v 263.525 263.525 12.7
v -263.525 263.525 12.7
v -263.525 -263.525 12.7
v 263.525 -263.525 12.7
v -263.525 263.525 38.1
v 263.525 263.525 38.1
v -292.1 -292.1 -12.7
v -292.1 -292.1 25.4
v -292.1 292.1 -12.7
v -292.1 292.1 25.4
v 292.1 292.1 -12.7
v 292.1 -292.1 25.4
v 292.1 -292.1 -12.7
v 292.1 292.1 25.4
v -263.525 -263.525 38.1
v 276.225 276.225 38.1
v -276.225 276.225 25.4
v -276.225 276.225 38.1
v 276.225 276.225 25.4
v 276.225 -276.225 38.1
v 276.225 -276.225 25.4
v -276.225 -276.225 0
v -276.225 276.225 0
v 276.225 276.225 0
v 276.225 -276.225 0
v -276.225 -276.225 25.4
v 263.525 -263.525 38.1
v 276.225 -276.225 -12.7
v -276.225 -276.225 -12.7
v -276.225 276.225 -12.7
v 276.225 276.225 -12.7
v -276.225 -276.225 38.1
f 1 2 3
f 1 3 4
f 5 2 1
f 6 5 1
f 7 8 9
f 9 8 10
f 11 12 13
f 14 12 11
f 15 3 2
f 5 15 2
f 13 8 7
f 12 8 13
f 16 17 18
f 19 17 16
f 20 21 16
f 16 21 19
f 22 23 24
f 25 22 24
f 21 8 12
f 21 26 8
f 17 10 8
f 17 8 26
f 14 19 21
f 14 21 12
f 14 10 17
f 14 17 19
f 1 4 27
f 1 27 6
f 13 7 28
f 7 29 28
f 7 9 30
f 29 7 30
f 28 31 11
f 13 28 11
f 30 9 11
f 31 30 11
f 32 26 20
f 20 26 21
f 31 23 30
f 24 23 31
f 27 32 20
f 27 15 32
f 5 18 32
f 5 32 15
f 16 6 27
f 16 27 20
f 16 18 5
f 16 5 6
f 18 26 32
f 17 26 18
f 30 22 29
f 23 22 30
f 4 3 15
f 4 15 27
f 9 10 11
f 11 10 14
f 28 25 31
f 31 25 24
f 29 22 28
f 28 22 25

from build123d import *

# Parameters (mm, degrees)
F0_W          = 584.2
F0_H          = 584.2
F1_DEPTH      = 12.7
F2_W          = 584.2
F2_H          = 584.2
F2_W_2        = 558.8
F2_H_2        = 558.8
F3_DEPTH      = 152.4
F4_W          = 1017.536164
F4_H          = 883.057714
F4_W_2        = 558.8
F4_H_2        = 558.8
F5_DEPTH      = 508
F6_W          = 552.45
F6_H          = 552.45
F6_W_2        = 527.05
F6_H_2        = 527.05
F7_DEPTH      = 25.4
F8_W          = 584.2
F8_H          = 584.2
F8_W_2        = 552.45
F8_H_2        = 552.45
F9_DEPTH      = 12.7
F9_DEPTH_BACK = 25.4


with BuildPart() as f1:
    # F0 (on Top) → F1 (new body)
    with BuildSketch(Plane.XY):
        Rectangle(F0_W, F0_H)
    extrude(amount=F1_DEPTH)

    # F2 (on face) → F3 (join)
    with BuildSketch(Plane.XY.offset(12.7)):
        Rectangle(F2_W, F2_H)
        Rectangle(F2_W_2, F2_H_2, mode=Mode.SUBTRACT)
    extrude(amount=F3_DEPTH)

    # F4 (on face) → F5 (cut)
    with BuildSketch(Plane.XY.offset(12.7)):
        Rectangle(F4_W, F4_H)
        Rectangle(F4_W_2, F4_H_2, mode=Mode.SUBTRACT)
    extrude(amount=F5_DEPTH, mode=Mode.SUBTRACT)

    # F6 (on face) → F7 (join)
    with BuildSketch(Plane.XY.offset(12.7)):
        Rectangle(F6_W, F6_H)
        Rectangle(F6_W_2, F6_H_2, mode=Mode.SUBTRACT)
    extrude(amount=F7_DEPTH)

    # F8 (on face) → F9 (join, two sides)
    with BuildSketch(Plane.XY.offset(12.7)) as f9_sk:
        Rectangle(F8_W, F8_H)
        Rectangle(F8_W_2, F8_H_2, mode=Mode.SUBTRACT)
    extrude(amount=F9_DEPTH)
    extrude(f9_sk.sketch, amount=-F9_DEPTH_BACK)


solid = f1.part
